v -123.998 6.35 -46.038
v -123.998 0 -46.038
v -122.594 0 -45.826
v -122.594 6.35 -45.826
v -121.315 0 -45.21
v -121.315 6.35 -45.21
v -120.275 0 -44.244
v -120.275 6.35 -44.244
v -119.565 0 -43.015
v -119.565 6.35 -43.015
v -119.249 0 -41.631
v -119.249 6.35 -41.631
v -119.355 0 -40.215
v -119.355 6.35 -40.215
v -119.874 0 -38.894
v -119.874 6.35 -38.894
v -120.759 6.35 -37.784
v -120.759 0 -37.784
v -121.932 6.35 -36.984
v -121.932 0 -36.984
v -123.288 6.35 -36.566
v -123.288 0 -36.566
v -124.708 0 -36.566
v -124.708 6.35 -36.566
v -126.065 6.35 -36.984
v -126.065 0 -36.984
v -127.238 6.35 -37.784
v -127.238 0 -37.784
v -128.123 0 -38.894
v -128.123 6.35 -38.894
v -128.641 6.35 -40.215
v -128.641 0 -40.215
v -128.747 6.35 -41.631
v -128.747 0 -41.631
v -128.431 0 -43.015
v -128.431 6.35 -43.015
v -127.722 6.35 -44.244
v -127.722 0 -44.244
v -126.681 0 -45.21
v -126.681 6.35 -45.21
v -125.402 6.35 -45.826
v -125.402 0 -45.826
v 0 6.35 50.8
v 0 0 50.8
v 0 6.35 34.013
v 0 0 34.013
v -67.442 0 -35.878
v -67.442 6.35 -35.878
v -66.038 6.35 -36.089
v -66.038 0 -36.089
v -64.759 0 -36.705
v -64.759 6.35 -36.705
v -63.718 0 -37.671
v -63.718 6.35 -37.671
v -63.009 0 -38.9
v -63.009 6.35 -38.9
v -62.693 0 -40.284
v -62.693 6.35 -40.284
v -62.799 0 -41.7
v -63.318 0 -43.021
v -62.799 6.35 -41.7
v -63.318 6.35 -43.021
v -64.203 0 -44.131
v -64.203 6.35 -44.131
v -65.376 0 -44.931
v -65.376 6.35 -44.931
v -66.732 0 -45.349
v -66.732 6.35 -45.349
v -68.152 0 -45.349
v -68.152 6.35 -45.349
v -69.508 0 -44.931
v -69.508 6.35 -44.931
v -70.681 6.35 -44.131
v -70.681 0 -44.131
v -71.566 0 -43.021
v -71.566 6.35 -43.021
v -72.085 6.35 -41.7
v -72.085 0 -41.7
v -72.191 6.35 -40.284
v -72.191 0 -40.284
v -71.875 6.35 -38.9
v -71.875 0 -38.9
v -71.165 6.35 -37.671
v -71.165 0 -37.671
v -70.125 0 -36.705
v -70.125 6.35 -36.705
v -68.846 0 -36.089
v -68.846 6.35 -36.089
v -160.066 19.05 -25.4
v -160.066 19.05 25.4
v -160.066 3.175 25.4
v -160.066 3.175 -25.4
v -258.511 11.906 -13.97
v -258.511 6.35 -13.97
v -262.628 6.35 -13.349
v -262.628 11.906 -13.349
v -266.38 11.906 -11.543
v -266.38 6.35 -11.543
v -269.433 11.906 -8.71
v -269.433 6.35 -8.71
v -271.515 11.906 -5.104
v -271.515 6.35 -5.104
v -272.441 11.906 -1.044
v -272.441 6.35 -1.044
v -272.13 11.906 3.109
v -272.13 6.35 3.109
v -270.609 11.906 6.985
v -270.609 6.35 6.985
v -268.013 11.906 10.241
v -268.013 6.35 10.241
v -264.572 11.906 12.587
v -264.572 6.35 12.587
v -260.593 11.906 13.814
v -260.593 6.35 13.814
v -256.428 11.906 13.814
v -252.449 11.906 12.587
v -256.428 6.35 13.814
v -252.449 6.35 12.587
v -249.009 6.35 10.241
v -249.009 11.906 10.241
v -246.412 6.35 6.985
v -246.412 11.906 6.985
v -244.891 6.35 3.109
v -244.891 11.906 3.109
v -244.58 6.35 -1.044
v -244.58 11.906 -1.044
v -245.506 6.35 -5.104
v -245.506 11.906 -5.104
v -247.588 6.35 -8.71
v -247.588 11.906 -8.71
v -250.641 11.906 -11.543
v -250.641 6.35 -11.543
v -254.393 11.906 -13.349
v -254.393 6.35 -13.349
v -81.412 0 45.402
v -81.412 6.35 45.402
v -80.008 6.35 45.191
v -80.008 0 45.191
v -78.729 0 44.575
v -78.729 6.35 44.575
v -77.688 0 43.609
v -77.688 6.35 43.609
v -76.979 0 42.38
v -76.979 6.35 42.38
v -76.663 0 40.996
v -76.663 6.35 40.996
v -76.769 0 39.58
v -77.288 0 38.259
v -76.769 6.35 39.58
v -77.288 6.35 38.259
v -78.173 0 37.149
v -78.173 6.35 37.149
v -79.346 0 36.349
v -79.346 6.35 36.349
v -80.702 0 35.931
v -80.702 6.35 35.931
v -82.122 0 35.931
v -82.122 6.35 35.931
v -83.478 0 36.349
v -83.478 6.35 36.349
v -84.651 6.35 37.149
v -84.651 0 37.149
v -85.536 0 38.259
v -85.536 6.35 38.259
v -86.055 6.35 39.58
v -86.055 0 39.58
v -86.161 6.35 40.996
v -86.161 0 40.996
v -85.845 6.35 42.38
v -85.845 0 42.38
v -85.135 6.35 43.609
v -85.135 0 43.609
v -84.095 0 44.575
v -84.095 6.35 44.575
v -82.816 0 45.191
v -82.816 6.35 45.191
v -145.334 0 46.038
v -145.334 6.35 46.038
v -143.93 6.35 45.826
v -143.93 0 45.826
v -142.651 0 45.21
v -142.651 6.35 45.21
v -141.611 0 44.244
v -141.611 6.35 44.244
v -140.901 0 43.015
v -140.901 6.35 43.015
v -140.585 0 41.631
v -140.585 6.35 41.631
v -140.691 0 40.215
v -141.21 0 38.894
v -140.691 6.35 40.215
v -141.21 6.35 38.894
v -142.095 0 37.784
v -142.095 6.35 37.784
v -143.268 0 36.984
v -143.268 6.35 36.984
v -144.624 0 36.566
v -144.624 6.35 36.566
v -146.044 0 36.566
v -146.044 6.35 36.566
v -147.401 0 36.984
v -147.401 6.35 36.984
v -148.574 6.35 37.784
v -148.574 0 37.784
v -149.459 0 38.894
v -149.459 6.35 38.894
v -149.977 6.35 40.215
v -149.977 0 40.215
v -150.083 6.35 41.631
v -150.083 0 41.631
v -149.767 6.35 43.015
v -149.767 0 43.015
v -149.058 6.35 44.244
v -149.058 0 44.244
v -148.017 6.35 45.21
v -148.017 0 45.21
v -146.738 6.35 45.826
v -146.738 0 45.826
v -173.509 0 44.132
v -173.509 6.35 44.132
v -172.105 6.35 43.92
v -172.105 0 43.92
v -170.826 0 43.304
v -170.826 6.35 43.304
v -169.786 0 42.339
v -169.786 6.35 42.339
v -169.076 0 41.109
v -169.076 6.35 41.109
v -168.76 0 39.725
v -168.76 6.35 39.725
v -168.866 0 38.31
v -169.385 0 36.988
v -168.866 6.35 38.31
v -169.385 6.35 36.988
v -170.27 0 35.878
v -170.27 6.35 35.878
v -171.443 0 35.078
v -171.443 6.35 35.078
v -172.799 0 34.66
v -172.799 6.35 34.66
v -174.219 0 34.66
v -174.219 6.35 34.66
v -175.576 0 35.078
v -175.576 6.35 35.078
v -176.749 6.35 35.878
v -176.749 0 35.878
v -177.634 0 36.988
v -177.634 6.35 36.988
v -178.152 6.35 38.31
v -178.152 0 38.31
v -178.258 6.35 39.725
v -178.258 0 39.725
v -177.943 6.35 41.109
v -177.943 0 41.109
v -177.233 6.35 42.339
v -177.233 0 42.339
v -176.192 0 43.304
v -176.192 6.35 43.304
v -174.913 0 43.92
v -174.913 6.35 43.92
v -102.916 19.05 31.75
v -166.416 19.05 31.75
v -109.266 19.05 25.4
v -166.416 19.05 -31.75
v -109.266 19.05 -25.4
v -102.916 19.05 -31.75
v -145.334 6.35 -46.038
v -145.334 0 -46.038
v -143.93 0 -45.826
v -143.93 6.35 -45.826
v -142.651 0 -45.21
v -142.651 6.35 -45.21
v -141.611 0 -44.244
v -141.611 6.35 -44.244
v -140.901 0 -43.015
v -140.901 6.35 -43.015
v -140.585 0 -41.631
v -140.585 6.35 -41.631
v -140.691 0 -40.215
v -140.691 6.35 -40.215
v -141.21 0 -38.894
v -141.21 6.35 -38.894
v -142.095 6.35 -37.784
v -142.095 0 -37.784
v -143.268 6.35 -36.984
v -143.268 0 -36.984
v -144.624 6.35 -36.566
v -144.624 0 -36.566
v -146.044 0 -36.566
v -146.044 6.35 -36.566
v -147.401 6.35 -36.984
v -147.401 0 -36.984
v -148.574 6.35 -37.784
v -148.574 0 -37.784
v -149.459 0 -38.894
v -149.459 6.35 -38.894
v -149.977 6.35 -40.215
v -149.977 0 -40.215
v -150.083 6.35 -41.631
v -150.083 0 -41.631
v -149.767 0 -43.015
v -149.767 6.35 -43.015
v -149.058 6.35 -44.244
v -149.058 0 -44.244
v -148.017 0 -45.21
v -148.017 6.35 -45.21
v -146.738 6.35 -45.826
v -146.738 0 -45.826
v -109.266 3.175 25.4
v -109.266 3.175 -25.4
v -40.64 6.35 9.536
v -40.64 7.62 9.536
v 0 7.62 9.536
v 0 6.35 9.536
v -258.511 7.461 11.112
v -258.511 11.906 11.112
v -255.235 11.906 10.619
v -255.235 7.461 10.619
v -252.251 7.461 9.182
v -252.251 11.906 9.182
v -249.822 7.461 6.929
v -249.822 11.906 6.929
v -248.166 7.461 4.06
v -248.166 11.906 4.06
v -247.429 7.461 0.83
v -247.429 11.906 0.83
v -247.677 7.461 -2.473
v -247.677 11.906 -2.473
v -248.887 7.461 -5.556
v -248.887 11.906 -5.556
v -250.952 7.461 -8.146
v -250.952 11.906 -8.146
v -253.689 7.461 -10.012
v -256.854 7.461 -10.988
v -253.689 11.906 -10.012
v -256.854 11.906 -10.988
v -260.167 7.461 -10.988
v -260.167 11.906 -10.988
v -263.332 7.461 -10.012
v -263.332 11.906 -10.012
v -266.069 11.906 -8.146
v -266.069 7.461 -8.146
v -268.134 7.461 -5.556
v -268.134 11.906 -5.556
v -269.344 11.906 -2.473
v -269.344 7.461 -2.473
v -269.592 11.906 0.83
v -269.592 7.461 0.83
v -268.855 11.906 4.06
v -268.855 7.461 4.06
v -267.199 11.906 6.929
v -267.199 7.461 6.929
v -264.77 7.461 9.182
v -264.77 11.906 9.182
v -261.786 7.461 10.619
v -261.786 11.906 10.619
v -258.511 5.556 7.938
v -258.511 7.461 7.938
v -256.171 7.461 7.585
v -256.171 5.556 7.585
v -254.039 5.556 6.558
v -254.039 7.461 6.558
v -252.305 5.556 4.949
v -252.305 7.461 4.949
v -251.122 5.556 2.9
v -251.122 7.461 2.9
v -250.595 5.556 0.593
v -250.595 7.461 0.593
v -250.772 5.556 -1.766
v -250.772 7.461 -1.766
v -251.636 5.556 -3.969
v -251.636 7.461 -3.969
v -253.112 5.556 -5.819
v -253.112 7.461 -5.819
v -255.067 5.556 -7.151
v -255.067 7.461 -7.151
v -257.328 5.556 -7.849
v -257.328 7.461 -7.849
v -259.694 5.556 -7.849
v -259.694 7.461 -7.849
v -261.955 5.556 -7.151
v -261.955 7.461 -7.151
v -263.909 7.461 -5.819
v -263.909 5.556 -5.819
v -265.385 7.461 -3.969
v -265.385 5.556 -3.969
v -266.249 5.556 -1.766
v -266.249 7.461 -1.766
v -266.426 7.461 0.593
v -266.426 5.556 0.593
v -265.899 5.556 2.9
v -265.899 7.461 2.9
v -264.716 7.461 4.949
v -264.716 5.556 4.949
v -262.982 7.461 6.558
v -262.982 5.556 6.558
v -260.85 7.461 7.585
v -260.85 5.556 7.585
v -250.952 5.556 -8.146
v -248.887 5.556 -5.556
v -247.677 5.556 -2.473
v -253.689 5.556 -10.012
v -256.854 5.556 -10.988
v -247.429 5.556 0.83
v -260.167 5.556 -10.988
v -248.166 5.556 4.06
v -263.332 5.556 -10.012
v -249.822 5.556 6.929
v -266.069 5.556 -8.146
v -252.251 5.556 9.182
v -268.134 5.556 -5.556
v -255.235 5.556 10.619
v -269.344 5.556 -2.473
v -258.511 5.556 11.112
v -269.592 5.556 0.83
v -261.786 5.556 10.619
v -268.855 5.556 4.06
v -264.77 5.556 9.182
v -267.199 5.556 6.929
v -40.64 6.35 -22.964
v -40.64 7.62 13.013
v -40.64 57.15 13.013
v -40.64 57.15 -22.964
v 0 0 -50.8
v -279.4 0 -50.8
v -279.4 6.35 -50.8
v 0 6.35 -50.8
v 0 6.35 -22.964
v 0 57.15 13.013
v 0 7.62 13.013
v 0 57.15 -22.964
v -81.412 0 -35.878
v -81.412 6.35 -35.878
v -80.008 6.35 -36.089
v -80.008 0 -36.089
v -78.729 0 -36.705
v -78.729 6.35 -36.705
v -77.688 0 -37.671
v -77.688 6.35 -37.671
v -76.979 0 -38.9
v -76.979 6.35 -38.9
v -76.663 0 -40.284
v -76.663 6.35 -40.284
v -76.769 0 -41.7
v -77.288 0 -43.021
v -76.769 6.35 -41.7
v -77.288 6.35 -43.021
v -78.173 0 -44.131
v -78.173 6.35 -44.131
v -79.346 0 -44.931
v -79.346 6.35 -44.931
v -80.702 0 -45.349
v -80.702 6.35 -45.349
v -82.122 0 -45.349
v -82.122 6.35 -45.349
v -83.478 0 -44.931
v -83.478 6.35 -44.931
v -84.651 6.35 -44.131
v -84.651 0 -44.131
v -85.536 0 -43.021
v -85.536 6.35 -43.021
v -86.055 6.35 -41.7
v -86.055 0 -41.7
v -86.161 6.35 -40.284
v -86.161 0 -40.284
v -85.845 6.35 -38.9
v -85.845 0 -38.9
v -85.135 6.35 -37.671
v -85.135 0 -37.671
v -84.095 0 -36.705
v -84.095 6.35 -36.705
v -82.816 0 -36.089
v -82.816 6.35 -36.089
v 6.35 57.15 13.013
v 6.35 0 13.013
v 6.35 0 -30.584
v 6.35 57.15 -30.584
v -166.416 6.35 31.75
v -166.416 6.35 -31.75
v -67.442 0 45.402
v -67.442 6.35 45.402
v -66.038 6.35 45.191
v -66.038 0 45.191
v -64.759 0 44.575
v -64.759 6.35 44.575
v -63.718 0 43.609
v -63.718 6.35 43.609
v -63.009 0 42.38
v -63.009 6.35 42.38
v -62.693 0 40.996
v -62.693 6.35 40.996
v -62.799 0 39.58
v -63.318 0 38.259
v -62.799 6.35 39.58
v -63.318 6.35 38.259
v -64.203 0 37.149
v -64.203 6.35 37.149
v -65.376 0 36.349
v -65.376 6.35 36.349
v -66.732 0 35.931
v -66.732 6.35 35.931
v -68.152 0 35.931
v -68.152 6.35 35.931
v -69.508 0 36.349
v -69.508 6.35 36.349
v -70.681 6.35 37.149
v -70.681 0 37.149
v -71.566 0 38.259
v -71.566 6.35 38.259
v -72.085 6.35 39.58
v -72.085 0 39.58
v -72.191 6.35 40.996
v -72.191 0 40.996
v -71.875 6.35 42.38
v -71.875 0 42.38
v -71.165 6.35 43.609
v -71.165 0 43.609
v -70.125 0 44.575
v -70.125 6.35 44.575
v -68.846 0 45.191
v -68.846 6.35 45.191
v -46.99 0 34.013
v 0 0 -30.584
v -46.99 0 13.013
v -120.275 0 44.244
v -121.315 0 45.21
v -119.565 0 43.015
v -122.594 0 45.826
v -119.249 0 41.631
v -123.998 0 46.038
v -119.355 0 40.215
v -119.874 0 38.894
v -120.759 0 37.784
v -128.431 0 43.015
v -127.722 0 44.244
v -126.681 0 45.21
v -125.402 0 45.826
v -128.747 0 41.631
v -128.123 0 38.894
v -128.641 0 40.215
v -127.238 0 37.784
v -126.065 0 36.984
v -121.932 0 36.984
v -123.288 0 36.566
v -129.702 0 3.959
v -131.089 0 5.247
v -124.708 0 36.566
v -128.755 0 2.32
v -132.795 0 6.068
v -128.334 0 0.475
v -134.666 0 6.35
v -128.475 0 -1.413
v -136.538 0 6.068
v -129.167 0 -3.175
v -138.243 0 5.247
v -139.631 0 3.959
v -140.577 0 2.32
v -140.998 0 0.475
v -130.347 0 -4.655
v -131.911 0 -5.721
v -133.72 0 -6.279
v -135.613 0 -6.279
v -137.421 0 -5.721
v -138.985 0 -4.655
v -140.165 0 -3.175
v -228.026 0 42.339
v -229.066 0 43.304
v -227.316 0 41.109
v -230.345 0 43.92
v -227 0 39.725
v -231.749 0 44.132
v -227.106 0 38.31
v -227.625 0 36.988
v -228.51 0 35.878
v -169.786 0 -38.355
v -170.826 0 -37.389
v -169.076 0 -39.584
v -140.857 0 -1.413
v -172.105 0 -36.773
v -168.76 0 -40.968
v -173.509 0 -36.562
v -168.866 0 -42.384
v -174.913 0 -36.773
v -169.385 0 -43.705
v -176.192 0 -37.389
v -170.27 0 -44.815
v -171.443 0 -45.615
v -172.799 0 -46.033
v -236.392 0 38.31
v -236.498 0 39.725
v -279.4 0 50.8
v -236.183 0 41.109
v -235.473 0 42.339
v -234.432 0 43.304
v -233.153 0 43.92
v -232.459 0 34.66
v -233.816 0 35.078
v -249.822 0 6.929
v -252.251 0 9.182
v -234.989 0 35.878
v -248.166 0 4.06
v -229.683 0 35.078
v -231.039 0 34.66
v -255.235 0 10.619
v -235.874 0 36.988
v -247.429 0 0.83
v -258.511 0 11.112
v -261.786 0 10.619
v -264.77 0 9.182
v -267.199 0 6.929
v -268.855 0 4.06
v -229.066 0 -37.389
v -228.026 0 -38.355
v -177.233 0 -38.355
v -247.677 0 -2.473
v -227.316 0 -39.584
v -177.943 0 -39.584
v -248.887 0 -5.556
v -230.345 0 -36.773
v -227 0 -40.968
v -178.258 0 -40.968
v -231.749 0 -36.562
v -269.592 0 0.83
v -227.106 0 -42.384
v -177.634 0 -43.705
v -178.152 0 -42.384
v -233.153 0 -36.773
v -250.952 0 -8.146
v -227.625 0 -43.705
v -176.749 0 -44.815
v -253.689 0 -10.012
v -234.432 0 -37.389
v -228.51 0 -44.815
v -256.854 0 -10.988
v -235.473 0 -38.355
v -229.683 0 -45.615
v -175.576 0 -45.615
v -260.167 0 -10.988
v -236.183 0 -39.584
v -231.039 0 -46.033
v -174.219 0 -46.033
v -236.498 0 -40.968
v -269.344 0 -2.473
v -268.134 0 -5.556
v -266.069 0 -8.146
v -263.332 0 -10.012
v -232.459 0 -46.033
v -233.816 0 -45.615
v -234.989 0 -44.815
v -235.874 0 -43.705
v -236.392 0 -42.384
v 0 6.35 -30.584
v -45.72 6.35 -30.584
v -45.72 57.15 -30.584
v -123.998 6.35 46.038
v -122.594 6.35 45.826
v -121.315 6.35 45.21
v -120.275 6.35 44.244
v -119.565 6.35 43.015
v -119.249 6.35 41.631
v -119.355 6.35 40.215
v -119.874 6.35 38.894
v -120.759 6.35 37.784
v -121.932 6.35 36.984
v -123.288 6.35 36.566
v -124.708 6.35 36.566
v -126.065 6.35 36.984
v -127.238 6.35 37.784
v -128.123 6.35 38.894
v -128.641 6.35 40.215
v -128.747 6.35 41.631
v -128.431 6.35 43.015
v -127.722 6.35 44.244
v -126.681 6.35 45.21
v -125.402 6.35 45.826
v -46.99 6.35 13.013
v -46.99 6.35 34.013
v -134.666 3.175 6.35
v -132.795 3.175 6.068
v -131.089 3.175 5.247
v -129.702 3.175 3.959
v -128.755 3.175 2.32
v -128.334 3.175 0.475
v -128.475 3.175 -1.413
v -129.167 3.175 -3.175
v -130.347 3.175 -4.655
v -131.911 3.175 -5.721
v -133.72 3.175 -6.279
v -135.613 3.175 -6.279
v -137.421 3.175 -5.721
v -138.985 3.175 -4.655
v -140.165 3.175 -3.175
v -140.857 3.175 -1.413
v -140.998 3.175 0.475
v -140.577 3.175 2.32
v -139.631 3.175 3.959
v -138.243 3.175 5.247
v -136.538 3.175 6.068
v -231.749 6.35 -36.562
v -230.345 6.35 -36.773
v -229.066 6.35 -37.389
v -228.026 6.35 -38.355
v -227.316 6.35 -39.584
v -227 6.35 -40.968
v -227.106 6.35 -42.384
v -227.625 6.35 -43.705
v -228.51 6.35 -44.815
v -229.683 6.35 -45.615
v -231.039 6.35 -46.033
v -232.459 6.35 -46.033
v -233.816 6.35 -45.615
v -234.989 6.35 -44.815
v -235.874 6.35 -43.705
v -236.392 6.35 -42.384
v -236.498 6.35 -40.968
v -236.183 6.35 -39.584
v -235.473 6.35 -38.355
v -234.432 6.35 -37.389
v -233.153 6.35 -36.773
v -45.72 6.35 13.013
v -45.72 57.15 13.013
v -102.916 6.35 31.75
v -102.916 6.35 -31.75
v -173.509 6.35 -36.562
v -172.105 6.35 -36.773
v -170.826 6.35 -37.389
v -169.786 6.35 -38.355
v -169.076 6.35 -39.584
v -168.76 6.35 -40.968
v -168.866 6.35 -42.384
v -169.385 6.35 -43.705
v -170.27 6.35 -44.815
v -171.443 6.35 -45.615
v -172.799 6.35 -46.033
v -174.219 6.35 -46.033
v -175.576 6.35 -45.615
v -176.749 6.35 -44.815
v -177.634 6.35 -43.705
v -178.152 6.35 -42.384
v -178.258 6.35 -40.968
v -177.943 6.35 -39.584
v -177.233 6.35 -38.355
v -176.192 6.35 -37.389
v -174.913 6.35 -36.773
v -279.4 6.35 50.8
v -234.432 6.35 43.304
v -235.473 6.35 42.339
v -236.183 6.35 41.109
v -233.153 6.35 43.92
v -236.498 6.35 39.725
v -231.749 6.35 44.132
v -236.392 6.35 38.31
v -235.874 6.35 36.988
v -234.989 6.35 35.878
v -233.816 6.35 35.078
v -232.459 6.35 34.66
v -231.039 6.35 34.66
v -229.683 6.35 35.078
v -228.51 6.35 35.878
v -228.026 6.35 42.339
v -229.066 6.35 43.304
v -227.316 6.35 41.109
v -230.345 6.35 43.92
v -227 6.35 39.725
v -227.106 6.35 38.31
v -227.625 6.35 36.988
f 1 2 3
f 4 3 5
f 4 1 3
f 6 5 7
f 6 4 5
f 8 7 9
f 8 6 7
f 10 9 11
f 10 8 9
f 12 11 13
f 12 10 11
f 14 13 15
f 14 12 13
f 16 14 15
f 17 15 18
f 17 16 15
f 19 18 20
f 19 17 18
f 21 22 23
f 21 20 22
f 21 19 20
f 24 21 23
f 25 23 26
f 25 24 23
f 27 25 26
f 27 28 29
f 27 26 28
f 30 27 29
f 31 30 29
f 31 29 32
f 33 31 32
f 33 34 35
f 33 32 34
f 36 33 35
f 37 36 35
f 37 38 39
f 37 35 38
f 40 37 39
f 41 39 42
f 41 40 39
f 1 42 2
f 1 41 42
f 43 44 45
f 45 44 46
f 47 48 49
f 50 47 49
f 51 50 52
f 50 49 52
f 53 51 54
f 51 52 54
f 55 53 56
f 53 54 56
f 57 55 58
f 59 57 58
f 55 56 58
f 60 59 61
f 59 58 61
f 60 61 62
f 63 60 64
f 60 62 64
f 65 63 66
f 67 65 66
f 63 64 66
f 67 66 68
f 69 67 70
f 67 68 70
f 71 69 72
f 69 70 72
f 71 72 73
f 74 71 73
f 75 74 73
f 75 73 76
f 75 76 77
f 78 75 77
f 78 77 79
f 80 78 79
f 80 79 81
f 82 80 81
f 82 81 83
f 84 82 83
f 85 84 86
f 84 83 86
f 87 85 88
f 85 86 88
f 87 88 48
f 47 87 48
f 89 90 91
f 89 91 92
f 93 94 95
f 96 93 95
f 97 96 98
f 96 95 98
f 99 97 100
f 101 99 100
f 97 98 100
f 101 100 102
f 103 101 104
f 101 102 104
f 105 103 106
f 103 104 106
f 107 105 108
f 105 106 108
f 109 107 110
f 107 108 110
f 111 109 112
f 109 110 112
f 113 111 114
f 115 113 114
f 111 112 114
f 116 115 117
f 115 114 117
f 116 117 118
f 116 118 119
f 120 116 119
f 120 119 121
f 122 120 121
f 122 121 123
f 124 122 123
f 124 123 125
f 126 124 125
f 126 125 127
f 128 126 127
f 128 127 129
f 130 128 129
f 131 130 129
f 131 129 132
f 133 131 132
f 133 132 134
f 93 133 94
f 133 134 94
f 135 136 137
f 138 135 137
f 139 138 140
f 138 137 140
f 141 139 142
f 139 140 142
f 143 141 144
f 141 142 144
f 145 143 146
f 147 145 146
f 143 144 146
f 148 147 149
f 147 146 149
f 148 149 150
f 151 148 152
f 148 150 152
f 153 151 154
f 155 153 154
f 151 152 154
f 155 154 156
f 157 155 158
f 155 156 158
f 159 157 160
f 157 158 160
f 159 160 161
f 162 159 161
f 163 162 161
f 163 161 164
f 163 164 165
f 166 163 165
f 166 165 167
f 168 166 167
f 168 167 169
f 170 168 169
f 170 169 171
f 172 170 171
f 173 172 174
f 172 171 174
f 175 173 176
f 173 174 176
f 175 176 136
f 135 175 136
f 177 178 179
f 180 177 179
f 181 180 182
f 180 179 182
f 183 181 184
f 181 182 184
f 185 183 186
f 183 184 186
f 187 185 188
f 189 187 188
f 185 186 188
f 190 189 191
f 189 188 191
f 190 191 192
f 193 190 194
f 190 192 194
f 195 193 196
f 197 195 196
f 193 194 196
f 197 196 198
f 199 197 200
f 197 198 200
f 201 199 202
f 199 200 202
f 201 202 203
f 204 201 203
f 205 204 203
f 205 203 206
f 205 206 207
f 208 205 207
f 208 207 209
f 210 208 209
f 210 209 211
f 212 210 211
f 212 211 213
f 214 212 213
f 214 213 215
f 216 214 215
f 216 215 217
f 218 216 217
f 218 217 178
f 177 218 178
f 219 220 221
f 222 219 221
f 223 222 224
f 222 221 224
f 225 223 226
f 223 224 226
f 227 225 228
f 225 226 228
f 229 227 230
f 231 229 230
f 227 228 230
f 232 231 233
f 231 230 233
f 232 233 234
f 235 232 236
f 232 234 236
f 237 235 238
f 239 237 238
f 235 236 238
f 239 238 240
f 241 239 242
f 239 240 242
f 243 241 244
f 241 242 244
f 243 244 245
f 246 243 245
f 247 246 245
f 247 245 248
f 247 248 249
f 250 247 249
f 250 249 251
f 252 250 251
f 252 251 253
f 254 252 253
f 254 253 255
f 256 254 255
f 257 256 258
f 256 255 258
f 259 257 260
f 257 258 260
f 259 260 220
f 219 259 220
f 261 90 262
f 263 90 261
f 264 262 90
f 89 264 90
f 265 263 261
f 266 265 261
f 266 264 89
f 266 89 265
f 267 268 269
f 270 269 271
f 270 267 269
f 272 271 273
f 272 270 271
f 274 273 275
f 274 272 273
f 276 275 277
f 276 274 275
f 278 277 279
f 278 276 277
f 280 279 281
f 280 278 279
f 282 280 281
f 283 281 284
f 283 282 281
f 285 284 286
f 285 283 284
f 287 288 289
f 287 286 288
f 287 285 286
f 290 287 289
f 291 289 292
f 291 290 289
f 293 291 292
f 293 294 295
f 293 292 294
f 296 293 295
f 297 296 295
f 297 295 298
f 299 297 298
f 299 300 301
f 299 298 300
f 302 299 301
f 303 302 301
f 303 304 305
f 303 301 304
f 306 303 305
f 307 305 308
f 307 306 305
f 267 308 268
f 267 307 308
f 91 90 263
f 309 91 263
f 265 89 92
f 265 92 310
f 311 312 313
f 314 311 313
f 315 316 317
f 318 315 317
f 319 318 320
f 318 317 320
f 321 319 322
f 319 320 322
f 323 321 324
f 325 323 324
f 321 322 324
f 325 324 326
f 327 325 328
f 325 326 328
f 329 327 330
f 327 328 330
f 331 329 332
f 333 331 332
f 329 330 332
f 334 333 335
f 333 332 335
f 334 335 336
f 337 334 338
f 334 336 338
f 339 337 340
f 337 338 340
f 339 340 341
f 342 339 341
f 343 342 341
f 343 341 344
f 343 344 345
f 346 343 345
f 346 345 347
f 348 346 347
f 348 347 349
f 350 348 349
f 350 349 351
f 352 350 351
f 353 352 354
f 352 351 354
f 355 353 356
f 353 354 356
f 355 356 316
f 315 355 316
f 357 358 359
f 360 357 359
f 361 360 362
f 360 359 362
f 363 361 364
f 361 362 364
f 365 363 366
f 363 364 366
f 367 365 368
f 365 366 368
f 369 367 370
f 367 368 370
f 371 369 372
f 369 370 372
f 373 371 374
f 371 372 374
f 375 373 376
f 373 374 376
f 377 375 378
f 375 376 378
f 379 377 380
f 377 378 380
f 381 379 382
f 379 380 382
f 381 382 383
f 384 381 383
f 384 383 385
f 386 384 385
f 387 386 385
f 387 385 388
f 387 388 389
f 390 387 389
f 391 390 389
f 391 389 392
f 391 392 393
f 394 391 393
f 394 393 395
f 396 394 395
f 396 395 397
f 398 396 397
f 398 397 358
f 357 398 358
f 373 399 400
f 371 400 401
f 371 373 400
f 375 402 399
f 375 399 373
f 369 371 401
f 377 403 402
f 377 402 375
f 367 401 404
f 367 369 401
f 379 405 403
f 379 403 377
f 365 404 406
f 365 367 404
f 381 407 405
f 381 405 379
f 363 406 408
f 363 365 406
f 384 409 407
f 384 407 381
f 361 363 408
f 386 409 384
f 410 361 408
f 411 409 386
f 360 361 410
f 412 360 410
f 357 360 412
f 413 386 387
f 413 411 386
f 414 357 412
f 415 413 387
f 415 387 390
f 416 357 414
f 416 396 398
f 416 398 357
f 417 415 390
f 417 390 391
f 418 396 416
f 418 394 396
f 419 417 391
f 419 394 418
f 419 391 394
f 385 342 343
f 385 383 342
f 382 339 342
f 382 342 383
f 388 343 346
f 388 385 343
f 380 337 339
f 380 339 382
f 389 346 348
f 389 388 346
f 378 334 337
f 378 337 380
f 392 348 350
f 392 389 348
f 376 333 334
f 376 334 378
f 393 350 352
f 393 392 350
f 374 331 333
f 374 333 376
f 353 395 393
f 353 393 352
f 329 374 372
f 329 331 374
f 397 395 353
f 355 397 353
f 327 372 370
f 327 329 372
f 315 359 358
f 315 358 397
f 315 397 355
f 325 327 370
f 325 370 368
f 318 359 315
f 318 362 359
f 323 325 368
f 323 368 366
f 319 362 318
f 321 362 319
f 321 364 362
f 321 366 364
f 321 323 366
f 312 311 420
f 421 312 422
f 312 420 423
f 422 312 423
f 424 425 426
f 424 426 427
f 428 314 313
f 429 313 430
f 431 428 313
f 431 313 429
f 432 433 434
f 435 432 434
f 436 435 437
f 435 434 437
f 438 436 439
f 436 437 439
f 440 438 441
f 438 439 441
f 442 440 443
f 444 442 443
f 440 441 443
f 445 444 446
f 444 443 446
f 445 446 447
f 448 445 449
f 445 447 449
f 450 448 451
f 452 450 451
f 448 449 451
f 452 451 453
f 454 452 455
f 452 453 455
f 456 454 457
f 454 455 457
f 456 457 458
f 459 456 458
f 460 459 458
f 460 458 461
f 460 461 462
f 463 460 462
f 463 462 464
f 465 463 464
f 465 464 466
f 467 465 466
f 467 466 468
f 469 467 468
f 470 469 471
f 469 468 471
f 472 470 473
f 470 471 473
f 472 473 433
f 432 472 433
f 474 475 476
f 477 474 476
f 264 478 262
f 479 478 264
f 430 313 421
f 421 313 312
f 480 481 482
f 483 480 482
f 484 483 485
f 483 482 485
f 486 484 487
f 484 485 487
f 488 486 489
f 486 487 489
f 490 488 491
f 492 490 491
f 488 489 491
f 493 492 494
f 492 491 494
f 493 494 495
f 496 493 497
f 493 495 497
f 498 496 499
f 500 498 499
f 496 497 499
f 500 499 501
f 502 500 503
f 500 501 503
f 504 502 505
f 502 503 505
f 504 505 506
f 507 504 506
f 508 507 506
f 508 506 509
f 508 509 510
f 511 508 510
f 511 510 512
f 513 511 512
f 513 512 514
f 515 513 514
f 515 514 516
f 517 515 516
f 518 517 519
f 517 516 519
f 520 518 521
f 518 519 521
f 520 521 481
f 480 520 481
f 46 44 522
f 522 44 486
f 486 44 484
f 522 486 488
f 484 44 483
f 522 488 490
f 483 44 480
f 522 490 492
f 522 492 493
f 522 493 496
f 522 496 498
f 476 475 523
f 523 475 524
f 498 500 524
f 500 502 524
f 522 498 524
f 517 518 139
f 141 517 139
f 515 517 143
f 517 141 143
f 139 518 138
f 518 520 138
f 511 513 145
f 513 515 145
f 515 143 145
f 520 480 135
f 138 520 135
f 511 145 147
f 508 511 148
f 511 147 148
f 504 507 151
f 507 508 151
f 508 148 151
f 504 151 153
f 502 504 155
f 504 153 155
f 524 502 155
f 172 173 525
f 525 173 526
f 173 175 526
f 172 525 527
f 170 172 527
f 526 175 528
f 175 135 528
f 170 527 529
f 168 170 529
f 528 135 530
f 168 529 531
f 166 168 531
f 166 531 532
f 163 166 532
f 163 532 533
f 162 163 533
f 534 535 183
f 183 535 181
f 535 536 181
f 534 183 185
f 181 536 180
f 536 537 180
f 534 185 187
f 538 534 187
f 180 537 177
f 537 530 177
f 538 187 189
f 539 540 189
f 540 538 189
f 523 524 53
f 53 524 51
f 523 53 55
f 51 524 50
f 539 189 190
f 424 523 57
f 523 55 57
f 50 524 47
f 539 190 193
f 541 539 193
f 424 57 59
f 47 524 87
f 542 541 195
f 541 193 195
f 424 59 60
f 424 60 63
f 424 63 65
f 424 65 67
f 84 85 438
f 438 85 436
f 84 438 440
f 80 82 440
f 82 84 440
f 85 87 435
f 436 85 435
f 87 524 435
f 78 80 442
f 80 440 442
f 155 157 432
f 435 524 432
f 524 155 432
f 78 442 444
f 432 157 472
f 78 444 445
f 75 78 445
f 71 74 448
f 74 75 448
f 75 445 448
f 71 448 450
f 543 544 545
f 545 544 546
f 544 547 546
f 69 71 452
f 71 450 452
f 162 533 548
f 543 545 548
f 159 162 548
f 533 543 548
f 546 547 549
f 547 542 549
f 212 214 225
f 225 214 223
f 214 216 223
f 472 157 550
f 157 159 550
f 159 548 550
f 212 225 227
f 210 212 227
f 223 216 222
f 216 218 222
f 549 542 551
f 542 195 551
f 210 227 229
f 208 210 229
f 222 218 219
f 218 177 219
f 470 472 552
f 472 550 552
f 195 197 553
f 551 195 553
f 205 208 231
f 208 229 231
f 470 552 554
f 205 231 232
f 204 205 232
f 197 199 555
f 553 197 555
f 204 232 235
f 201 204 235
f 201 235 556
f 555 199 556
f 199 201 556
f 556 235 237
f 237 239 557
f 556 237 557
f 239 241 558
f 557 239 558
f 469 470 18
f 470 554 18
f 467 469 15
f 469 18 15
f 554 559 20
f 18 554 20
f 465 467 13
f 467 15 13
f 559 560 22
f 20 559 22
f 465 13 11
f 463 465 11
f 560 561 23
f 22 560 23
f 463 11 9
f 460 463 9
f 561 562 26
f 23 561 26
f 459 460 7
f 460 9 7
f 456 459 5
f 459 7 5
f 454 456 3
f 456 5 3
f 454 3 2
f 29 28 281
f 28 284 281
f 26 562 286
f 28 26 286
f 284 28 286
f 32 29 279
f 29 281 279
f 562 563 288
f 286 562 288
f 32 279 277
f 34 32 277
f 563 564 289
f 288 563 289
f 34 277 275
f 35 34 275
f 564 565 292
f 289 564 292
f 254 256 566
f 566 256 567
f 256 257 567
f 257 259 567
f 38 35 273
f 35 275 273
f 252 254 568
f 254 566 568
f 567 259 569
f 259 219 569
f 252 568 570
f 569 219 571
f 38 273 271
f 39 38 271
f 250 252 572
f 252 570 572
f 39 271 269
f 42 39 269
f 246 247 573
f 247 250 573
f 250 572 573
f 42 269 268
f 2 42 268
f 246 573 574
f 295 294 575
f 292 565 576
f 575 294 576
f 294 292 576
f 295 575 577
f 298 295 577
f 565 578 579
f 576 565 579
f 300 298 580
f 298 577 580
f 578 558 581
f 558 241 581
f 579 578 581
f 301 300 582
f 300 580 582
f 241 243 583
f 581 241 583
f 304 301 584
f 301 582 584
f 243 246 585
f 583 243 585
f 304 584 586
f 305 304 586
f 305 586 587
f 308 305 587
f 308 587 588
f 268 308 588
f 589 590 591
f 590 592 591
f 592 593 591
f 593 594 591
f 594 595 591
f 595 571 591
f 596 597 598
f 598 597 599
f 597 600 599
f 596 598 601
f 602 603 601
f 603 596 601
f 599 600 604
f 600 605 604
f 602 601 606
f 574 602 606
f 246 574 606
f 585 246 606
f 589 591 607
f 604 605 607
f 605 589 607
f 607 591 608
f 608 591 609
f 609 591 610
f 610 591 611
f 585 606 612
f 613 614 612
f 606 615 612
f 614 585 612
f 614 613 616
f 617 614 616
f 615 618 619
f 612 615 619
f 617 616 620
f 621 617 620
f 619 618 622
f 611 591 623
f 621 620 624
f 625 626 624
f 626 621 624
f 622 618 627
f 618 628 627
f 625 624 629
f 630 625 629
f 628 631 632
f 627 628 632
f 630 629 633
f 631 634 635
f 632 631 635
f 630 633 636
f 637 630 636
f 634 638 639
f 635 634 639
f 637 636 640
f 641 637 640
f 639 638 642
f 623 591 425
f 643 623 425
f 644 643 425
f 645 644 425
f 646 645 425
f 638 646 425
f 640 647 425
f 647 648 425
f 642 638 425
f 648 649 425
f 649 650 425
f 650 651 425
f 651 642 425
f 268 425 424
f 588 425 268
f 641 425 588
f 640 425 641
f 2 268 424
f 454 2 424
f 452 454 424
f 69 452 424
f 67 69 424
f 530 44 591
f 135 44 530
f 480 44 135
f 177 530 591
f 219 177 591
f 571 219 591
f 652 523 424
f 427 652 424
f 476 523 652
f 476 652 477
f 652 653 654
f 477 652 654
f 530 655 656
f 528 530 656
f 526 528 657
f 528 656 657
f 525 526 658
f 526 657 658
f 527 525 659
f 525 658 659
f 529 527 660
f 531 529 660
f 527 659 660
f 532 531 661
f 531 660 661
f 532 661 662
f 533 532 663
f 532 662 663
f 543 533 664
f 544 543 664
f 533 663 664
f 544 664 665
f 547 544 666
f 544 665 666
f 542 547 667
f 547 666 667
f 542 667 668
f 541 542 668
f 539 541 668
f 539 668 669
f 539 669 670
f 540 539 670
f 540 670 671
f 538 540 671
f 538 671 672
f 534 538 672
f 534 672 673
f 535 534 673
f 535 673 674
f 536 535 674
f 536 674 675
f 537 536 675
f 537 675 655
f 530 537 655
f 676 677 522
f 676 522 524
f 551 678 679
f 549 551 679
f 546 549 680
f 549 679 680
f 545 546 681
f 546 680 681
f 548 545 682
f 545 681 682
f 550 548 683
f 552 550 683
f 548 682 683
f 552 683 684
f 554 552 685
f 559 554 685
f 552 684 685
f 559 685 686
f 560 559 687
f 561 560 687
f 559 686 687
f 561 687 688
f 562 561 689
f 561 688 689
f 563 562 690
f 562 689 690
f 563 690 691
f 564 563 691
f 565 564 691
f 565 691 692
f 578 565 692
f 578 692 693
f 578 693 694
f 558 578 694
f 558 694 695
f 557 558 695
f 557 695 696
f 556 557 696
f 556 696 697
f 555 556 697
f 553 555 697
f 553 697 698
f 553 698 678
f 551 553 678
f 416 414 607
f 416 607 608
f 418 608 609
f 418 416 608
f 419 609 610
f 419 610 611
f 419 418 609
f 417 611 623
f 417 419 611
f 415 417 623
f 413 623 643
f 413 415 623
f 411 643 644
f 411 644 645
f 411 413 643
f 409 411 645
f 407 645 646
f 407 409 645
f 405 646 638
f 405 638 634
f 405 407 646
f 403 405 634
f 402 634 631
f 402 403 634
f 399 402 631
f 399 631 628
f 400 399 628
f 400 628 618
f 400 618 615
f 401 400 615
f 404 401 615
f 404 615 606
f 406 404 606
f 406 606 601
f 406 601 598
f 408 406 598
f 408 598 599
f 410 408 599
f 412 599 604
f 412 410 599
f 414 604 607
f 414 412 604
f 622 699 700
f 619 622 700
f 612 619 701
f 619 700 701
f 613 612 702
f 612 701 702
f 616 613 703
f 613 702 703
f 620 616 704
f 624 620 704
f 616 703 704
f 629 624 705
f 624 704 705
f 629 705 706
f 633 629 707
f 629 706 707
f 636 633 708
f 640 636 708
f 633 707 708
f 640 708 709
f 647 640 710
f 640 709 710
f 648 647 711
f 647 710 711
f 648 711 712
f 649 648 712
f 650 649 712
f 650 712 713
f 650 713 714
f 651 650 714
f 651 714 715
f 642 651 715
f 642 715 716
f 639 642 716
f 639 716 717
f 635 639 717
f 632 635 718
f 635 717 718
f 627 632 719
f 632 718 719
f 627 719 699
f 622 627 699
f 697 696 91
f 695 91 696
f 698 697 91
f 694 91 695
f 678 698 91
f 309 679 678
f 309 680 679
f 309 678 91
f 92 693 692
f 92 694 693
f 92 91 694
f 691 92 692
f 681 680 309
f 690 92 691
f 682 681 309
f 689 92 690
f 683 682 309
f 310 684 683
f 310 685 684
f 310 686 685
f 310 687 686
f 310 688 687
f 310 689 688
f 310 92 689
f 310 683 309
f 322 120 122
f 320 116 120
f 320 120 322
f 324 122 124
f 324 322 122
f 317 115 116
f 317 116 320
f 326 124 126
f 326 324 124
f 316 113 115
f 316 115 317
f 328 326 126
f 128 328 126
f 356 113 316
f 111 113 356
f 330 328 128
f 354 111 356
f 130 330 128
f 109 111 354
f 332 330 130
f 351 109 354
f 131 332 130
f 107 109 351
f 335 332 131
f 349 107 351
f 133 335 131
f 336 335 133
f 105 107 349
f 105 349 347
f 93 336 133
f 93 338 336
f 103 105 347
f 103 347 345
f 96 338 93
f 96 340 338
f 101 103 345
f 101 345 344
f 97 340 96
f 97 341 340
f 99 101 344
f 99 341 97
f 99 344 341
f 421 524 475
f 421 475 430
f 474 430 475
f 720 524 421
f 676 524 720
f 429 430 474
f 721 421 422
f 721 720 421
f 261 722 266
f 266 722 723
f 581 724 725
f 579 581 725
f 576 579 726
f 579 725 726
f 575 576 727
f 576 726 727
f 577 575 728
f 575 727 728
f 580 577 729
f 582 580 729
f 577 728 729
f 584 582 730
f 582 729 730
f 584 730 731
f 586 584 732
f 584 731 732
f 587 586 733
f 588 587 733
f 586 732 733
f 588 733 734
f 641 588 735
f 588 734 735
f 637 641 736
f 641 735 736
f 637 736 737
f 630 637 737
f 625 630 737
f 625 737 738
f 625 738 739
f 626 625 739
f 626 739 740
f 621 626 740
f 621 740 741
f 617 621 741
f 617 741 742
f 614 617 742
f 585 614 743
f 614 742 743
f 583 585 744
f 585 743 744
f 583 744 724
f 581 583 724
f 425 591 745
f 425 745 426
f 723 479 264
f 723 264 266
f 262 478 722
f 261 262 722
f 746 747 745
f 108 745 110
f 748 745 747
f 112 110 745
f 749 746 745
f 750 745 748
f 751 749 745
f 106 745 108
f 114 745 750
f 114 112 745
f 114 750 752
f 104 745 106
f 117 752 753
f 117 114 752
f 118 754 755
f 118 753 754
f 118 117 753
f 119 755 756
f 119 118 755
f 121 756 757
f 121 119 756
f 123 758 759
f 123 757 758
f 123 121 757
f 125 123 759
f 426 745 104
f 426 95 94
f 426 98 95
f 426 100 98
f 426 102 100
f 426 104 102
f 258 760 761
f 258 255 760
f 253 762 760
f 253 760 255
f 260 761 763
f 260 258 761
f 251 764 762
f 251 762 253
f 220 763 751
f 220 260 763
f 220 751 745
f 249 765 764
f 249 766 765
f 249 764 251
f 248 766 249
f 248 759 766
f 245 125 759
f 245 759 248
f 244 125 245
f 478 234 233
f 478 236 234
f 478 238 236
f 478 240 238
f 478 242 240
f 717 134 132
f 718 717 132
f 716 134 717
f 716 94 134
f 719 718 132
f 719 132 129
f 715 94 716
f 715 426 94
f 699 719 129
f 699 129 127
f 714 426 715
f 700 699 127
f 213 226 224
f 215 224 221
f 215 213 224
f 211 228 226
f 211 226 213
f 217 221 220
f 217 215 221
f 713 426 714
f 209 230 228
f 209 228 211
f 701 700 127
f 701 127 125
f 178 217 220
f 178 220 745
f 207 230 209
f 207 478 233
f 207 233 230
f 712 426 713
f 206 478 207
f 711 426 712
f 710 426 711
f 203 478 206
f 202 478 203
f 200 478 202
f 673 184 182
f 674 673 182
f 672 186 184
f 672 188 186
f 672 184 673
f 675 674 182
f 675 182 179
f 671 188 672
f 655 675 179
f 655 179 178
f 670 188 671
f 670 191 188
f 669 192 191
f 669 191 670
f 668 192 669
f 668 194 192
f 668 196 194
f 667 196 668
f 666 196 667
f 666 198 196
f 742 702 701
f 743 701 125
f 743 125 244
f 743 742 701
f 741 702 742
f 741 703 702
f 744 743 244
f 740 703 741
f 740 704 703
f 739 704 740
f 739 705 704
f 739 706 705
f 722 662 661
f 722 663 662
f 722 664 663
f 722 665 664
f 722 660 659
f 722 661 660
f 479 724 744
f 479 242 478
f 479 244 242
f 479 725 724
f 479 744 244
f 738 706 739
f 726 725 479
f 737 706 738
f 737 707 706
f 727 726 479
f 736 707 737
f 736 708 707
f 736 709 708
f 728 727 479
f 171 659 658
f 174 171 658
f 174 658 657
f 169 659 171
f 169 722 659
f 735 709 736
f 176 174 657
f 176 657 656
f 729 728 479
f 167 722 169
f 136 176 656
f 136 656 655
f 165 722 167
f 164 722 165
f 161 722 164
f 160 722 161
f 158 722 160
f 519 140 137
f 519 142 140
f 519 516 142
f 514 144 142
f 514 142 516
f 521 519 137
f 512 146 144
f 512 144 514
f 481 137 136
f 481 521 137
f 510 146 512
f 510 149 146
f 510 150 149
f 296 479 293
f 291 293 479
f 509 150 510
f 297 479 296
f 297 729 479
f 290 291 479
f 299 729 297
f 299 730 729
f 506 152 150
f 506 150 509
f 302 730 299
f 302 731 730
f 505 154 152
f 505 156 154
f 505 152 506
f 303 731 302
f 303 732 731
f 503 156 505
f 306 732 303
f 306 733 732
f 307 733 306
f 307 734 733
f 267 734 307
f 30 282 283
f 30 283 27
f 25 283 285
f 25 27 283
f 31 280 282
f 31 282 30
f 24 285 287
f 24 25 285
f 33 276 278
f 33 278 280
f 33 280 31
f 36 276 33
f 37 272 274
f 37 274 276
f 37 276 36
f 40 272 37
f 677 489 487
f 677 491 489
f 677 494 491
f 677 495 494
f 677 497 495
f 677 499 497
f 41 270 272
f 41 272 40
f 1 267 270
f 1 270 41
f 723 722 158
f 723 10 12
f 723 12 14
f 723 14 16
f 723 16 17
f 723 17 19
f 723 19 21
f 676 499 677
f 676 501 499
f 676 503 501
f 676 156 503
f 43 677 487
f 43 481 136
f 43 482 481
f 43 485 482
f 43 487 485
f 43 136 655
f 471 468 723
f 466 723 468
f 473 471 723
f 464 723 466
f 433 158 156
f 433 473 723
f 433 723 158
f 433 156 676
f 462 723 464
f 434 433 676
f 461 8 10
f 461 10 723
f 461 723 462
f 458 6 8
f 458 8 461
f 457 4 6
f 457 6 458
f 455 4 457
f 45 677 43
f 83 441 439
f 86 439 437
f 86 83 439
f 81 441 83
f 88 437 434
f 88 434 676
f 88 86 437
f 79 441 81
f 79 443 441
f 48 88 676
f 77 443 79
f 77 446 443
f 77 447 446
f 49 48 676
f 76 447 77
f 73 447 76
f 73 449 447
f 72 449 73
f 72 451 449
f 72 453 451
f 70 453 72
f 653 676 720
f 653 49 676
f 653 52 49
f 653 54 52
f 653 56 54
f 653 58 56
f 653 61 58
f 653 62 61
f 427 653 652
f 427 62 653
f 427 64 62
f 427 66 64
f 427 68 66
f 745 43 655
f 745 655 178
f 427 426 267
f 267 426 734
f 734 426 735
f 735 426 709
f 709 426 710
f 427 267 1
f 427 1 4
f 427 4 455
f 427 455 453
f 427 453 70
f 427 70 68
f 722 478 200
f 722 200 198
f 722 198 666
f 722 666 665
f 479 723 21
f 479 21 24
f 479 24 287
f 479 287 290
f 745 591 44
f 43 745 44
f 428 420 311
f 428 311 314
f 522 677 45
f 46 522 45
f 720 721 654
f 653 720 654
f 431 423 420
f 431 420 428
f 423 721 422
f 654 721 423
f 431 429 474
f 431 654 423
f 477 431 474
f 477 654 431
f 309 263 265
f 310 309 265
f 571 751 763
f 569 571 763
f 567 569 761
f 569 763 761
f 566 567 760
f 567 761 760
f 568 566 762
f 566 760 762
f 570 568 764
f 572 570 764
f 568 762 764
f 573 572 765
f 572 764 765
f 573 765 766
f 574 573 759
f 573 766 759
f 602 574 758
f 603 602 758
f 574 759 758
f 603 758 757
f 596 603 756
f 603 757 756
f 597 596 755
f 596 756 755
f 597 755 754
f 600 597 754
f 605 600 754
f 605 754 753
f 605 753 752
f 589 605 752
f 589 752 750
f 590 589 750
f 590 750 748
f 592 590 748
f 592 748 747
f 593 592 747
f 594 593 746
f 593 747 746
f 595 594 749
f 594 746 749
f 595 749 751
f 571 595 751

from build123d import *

# Parameters (mm, degrees)
SKETCH1_W            = 279.4
SKETCH1_H            = 101.6
BOSS_EXTRUDE1_DEPTH  = 6.35
SKETCH2_R            = 13.97
BOSS_EXTRUDE3_DEPTH  = 5.55625
SKETCH9_R            = 11.1125
CUT_EXTRUDE4_DEPTH   = 4.445
CUT_EXTRUDE5_START   = -5.55625
SKETCH10_R           = 11.1125
CUT_EXTRUDE5_DEPTH   = 5.55625
SKETCH11_R           = 7.9375
CUT_EXTRUDE6_DEPTH   = 285.078633923
SKETCH12_R           = 6.35
CUT_EXTRUDE7_DEPTH   = 285.051619429
SKETCH22_W           = 63.5
SKETCH22_H           = 63.5
BOSS_EXTRUDE7_DEPTH  = 12.7
SKETCH25_W           = 50.8
SKETCH25_H           = 50.8
CUT_EXTRUDE11_DEPTH  = 15.875
SKETCH32_R           = 4.7625
CUT_EXTRUDE12_DEPTH  = 6.35
SKETCH38_W           = 46.99
SKETCH38_H           = 18.470251096
CUT_EXTRUDE13_DEPTH  = 6.35
SKETCH60_R           = 4.7625
CUT_EXTRUDE23_DEPTH  = 6.35
SKETCH64_R           = 4.7625
CUT_EXTRUDE24_DEPTH  = 285.264471927
SKETCH65_W           = 52.07
SKETCH65_H           = 43.596758628
BOSS_EXTRUDE8_DEPTH  = 50.8
SKETCH68_W           = 43.596758628
SKETCH68_H           = 6.35
BOSS_EXTRUDE10_DEPTH = 6.35
SKETCH66_W           = 40.64
SKETCH66_H           = 32.500000024
CUT_EXTRUDE28_DEPTH  = 50.8
SKETCH69_W           = 40.64
SKETCH69_H           = 49.53
CUT_EXTRUDE29_DEPTH  = 292.497724665
SKETCH70_W           = 46.99
SKETCH70_H           = 2.529758466
CUT_EXTRUDE30_DEPTH  = 289.488543967


with BuildPart() as part:
    # Sketch1 → Boss-Extrude1 (new body)
    with BuildSketch(Plane(origin=(0, 0, 0), x_dir=(1, 0, 0), z_dir=(0, 1, 0))):
        with Locations((-139.7, 0)):
            Rectangle(SKETCH1_W, SKETCH1_H)
    extrude(amount=BOSS_EXTRUDE1_DEPTH)

    # Sketch2 → Boss-Extrude3 (add)
    with BuildSketch(Plane(origin=(0, 6.35, 0), x_dir=(1, 0, 0), z_dir=(0, 1, 0))):
        with Locations(Location((-258.510557857, 0, 0), (0, 0, 90))):
            Circle(SKETCH2_R)
    extrude(amount=BOSS_EXTRUDE3_DEPTH)

    # Sketch9 → Cut-Extrude4 (cut)
    with BuildSketch(Plane(origin=(0, 11.90625, 0), x_dir=(1, 0, 0), z_dir=(0, 1, 0))):
        with Locations(Location((-258.510557857, 0, 0), (0, 0, 270))):
            Circle(SKETCH9_R)
    extrude(amount=-CUT_EXTRUDE4_DEPTH, mode=Mode.SUBTRACT)

    # Sketch10 → Cut-Extrude5 (cut)
    with BuildSketch(Plane(origin=(0, 0, 0), x_dir=(-1, 0, 0), z_dir=(0, -1, 0)).offset(CUT_EXTRUDE5_START)):
        with Locations(Location((258.510557857, 0, 0), (0, 0, 270))):
            Circle(SKETCH10_R)
    extrude(amount=CUT_EXTRUDE5_DEPTH, mode=Mode.SUBTRACT)

    # Sketch11 → Cut-Extrude6 (cut, through all)
    with BuildSketch(Plane(origin=(0, 7.46125, 0), x_dir=(1, 0, 0), z_dir=(0, 1, 0))):
        with Locations(Location((-258.510557857, 0, 0), (0, 0, 270))):
            Circle(SKETCH11_R)
    extrude(amount=-CUT_EXTRUDE6_DEPTH, mode=Mode.SUBTRACT)

    # Sketch12 → Cut-Extrude7 (cut, through all)
    with BuildSketch(Plane(origin=(0, 6.35, 0), x_dir=(1, 0, 0), z_dir=(0, 1, 0))):
        with Locations(Location((-134.666203771, 0, 0), (0, 0, 270))):
            Circle(SKETCH12_R)
    extrude(amount=-CUT_EXTRUDE7_DEPTH, mode=Mode.SUBTRACT)

    # Sketch22 → Boss-Extrude7 (add)
    with BuildSketch(Plane(origin=(0, 6.35, 0), x_dir=(1, 0, 0), z_dir=(0, 1, 0))):
        with Locations((-134.666203771, 0)):
            Rectangle(SKETCH22_W, SKETCH22_H)
    extrude(amount=BOSS_EXTRUDE7_DEPTH)

    # Sketch25 → Cut-Extrude11 (cut)
    with BuildSketch(Plane(origin=(0, 19.05, 0), x_dir=(1, 0, 0), z_dir=(0, 1, 0))):
        with Locations((-134.666203771, 0)):
            Rectangle(SKETCH25_W, SKETCH25_H)
    extrude(amount=-CUT_EXTRUDE11_DEPTH, mode=Mode.SUBTRACT)

    # Sketch32 → Cut-Extrude12 (cut)
    with BuildSketch(Plane(origin=(0, 6.35, 0), x_dir=(1, 0, 0), z_dir=(0, 1, 0))):
        with Locations(Location((-67.44195898, -40.64, 0), (0, 0, 270))):
            Circle(SKETCH32_R)
        with Locations(Location((-81.41195898, -40.64, 0), (0, 0, 270))):
            Circle(SKETCH32_R)
        with Locations(Location((-67.44195898, 40.64, 0), (0, 0, 270))):
            Circle(SKETCH32_R)
        with Locations(Location((-81.41195898, 40.64, 0), (0, 0, 270))):
            Circle(SKETCH32_R)
    extrude(amount=-CUT_EXTRUDE12_DEPTH, mode=Mode.SUBTRACT)

    # Sketch38 → Cut-Extrude13 (cut)
    with BuildSketch(Plane(origin=(0, 6.35, 0), x_dir=(1, 0, 0), z_dir=(0, 1, 0))):
        with Locations((-23.495, -24.777709652)):
            Rectangle(SKETCH38_W, SKETCH38_H)
    extrude(amount=-CUT_EXTRUDE13_DEPTH, mode=Mode.SUBTRACT)

    # Sketch60 → Cut-Extrude23 (cut)
    with BuildSketch(Plane(origin=(0, 6.35, 0), x_dir=(1, 0, 0), z_dir=(0, 1, 0))):
        with Locations(Location((-231.7492444, 41.324145444, 0), (0, 0, 270))):
            Circle(SKETCH60_R)
        with Locations(Location((-231.7492444, -39.369341378, 0), (0, 0, 270))):
            Circle(SKETCH60_R)
        with Locations(Location((-173.509244294, -39.369341378, 0), (0, 0, 270))):
            Circle(SKETCH60_R)
        with Locations(Location((-173.509244294, 41.324145444, 0), (0, 0, 270))):
            Circle(SKETCH60_R)
    extrude(amount=-CUT_EXTRUDE23_DEPTH, mode=Mode.SUBTRACT)

    # Sketch64 → Cut-Extrude24 (cut, through all)
    with BuildSketch(Plane(origin=(0, 6.35, 0), x_dir=(1, 0, 0), z_dir=(0, 1, 0))):
        with Locations(Location((-145.334203771, -41.275, 0), (0, 0, 270))):
            Circle(SKETCH64_R)
        with Locations(Location((-123.998203771, -41.275, 0), (0, 0, 270))):
            Circle(SKETCH64_R)
    cut_extrude24 = extrude(amount=-CUT_EXTRUDE24_DEPTH, mode=Mode.SUBTRACT)

    # Mirror1: Cut-Extrude24 across plane
    add(cut_extrude24.mirror(Plane.XY), mode=Mode.SUBTRACT)

    # Sketch65 → Boss-Extrude8 (add)
    with BuildSketch(Plane(origin=(0, 6.35, 0), x_dir=(1, 0, 0), z_dir=(0, 1, 0))):
        with Locations((-19.685, 8.785553676)):
            Rectangle(SKETCH65_W, SKETCH65_H)
    extrude(amount=BOSS_EXTRUDE8_DEPTH)

    # Sketch68 → Boss-Extrude10 (add)
    with BuildSketch(Plane(origin=(0, 0, 0), x_dir=(0, 0, -1), z_dir=(1, 0, 0))):
        with Locations((8.785553676, 3.175)):
            Rectangle(SKETCH68_W, SKETCH68_H)
    extrude(amount=BOSS_EXTRUDE10_DEPTH)

    # Sketch66 → Cut-Extrude28 (cut)
    with BuildSketch(Plane(origin=(0, 57.15, 0), x_dir=(1, 0, 0), z_dir=(0, 1, 0))):
        with Locations((-20.32, 6.713932978)):
            Rectangle(SKETCH66_W, SKETCH66_H)
    extrude(amount=-CUT_EXTRUDE28_DEPTH, mode=Mode.SUBTRACT)

    # Sketch69 → Cut-Extrude29 (cut, through all)
    with BuildSketch(Plane(origin=(0, 0, 9.536067034), x_dir=(-1, 0, 0), z_dir=(0, 0, -1))):
        with Locations((20.32, 32.385)):
            Rectangle(SKETCH69_W, SKETCH69_H)
    extrude(amount=-CUT_EXTRUDE29_DEPTH, mode=Mode.SUBTRACT)

    # Sketch70 → Cut-Extrude30 (cut, through all)
    with BuildSketch(Plane(origin=(0, 6.35, 0), x_dir=(1, 0, 0), z_dir=(0, 1, 0))):
        with Locations((-23.495, -14.277704871)):
            Rectangle(SKETCH70_W, SKETCH70_H)
    extrude(amount=-CUT_EXTRUDE30_DEPTH, mode=Mode.SUBTRACT)


solid = part.part
